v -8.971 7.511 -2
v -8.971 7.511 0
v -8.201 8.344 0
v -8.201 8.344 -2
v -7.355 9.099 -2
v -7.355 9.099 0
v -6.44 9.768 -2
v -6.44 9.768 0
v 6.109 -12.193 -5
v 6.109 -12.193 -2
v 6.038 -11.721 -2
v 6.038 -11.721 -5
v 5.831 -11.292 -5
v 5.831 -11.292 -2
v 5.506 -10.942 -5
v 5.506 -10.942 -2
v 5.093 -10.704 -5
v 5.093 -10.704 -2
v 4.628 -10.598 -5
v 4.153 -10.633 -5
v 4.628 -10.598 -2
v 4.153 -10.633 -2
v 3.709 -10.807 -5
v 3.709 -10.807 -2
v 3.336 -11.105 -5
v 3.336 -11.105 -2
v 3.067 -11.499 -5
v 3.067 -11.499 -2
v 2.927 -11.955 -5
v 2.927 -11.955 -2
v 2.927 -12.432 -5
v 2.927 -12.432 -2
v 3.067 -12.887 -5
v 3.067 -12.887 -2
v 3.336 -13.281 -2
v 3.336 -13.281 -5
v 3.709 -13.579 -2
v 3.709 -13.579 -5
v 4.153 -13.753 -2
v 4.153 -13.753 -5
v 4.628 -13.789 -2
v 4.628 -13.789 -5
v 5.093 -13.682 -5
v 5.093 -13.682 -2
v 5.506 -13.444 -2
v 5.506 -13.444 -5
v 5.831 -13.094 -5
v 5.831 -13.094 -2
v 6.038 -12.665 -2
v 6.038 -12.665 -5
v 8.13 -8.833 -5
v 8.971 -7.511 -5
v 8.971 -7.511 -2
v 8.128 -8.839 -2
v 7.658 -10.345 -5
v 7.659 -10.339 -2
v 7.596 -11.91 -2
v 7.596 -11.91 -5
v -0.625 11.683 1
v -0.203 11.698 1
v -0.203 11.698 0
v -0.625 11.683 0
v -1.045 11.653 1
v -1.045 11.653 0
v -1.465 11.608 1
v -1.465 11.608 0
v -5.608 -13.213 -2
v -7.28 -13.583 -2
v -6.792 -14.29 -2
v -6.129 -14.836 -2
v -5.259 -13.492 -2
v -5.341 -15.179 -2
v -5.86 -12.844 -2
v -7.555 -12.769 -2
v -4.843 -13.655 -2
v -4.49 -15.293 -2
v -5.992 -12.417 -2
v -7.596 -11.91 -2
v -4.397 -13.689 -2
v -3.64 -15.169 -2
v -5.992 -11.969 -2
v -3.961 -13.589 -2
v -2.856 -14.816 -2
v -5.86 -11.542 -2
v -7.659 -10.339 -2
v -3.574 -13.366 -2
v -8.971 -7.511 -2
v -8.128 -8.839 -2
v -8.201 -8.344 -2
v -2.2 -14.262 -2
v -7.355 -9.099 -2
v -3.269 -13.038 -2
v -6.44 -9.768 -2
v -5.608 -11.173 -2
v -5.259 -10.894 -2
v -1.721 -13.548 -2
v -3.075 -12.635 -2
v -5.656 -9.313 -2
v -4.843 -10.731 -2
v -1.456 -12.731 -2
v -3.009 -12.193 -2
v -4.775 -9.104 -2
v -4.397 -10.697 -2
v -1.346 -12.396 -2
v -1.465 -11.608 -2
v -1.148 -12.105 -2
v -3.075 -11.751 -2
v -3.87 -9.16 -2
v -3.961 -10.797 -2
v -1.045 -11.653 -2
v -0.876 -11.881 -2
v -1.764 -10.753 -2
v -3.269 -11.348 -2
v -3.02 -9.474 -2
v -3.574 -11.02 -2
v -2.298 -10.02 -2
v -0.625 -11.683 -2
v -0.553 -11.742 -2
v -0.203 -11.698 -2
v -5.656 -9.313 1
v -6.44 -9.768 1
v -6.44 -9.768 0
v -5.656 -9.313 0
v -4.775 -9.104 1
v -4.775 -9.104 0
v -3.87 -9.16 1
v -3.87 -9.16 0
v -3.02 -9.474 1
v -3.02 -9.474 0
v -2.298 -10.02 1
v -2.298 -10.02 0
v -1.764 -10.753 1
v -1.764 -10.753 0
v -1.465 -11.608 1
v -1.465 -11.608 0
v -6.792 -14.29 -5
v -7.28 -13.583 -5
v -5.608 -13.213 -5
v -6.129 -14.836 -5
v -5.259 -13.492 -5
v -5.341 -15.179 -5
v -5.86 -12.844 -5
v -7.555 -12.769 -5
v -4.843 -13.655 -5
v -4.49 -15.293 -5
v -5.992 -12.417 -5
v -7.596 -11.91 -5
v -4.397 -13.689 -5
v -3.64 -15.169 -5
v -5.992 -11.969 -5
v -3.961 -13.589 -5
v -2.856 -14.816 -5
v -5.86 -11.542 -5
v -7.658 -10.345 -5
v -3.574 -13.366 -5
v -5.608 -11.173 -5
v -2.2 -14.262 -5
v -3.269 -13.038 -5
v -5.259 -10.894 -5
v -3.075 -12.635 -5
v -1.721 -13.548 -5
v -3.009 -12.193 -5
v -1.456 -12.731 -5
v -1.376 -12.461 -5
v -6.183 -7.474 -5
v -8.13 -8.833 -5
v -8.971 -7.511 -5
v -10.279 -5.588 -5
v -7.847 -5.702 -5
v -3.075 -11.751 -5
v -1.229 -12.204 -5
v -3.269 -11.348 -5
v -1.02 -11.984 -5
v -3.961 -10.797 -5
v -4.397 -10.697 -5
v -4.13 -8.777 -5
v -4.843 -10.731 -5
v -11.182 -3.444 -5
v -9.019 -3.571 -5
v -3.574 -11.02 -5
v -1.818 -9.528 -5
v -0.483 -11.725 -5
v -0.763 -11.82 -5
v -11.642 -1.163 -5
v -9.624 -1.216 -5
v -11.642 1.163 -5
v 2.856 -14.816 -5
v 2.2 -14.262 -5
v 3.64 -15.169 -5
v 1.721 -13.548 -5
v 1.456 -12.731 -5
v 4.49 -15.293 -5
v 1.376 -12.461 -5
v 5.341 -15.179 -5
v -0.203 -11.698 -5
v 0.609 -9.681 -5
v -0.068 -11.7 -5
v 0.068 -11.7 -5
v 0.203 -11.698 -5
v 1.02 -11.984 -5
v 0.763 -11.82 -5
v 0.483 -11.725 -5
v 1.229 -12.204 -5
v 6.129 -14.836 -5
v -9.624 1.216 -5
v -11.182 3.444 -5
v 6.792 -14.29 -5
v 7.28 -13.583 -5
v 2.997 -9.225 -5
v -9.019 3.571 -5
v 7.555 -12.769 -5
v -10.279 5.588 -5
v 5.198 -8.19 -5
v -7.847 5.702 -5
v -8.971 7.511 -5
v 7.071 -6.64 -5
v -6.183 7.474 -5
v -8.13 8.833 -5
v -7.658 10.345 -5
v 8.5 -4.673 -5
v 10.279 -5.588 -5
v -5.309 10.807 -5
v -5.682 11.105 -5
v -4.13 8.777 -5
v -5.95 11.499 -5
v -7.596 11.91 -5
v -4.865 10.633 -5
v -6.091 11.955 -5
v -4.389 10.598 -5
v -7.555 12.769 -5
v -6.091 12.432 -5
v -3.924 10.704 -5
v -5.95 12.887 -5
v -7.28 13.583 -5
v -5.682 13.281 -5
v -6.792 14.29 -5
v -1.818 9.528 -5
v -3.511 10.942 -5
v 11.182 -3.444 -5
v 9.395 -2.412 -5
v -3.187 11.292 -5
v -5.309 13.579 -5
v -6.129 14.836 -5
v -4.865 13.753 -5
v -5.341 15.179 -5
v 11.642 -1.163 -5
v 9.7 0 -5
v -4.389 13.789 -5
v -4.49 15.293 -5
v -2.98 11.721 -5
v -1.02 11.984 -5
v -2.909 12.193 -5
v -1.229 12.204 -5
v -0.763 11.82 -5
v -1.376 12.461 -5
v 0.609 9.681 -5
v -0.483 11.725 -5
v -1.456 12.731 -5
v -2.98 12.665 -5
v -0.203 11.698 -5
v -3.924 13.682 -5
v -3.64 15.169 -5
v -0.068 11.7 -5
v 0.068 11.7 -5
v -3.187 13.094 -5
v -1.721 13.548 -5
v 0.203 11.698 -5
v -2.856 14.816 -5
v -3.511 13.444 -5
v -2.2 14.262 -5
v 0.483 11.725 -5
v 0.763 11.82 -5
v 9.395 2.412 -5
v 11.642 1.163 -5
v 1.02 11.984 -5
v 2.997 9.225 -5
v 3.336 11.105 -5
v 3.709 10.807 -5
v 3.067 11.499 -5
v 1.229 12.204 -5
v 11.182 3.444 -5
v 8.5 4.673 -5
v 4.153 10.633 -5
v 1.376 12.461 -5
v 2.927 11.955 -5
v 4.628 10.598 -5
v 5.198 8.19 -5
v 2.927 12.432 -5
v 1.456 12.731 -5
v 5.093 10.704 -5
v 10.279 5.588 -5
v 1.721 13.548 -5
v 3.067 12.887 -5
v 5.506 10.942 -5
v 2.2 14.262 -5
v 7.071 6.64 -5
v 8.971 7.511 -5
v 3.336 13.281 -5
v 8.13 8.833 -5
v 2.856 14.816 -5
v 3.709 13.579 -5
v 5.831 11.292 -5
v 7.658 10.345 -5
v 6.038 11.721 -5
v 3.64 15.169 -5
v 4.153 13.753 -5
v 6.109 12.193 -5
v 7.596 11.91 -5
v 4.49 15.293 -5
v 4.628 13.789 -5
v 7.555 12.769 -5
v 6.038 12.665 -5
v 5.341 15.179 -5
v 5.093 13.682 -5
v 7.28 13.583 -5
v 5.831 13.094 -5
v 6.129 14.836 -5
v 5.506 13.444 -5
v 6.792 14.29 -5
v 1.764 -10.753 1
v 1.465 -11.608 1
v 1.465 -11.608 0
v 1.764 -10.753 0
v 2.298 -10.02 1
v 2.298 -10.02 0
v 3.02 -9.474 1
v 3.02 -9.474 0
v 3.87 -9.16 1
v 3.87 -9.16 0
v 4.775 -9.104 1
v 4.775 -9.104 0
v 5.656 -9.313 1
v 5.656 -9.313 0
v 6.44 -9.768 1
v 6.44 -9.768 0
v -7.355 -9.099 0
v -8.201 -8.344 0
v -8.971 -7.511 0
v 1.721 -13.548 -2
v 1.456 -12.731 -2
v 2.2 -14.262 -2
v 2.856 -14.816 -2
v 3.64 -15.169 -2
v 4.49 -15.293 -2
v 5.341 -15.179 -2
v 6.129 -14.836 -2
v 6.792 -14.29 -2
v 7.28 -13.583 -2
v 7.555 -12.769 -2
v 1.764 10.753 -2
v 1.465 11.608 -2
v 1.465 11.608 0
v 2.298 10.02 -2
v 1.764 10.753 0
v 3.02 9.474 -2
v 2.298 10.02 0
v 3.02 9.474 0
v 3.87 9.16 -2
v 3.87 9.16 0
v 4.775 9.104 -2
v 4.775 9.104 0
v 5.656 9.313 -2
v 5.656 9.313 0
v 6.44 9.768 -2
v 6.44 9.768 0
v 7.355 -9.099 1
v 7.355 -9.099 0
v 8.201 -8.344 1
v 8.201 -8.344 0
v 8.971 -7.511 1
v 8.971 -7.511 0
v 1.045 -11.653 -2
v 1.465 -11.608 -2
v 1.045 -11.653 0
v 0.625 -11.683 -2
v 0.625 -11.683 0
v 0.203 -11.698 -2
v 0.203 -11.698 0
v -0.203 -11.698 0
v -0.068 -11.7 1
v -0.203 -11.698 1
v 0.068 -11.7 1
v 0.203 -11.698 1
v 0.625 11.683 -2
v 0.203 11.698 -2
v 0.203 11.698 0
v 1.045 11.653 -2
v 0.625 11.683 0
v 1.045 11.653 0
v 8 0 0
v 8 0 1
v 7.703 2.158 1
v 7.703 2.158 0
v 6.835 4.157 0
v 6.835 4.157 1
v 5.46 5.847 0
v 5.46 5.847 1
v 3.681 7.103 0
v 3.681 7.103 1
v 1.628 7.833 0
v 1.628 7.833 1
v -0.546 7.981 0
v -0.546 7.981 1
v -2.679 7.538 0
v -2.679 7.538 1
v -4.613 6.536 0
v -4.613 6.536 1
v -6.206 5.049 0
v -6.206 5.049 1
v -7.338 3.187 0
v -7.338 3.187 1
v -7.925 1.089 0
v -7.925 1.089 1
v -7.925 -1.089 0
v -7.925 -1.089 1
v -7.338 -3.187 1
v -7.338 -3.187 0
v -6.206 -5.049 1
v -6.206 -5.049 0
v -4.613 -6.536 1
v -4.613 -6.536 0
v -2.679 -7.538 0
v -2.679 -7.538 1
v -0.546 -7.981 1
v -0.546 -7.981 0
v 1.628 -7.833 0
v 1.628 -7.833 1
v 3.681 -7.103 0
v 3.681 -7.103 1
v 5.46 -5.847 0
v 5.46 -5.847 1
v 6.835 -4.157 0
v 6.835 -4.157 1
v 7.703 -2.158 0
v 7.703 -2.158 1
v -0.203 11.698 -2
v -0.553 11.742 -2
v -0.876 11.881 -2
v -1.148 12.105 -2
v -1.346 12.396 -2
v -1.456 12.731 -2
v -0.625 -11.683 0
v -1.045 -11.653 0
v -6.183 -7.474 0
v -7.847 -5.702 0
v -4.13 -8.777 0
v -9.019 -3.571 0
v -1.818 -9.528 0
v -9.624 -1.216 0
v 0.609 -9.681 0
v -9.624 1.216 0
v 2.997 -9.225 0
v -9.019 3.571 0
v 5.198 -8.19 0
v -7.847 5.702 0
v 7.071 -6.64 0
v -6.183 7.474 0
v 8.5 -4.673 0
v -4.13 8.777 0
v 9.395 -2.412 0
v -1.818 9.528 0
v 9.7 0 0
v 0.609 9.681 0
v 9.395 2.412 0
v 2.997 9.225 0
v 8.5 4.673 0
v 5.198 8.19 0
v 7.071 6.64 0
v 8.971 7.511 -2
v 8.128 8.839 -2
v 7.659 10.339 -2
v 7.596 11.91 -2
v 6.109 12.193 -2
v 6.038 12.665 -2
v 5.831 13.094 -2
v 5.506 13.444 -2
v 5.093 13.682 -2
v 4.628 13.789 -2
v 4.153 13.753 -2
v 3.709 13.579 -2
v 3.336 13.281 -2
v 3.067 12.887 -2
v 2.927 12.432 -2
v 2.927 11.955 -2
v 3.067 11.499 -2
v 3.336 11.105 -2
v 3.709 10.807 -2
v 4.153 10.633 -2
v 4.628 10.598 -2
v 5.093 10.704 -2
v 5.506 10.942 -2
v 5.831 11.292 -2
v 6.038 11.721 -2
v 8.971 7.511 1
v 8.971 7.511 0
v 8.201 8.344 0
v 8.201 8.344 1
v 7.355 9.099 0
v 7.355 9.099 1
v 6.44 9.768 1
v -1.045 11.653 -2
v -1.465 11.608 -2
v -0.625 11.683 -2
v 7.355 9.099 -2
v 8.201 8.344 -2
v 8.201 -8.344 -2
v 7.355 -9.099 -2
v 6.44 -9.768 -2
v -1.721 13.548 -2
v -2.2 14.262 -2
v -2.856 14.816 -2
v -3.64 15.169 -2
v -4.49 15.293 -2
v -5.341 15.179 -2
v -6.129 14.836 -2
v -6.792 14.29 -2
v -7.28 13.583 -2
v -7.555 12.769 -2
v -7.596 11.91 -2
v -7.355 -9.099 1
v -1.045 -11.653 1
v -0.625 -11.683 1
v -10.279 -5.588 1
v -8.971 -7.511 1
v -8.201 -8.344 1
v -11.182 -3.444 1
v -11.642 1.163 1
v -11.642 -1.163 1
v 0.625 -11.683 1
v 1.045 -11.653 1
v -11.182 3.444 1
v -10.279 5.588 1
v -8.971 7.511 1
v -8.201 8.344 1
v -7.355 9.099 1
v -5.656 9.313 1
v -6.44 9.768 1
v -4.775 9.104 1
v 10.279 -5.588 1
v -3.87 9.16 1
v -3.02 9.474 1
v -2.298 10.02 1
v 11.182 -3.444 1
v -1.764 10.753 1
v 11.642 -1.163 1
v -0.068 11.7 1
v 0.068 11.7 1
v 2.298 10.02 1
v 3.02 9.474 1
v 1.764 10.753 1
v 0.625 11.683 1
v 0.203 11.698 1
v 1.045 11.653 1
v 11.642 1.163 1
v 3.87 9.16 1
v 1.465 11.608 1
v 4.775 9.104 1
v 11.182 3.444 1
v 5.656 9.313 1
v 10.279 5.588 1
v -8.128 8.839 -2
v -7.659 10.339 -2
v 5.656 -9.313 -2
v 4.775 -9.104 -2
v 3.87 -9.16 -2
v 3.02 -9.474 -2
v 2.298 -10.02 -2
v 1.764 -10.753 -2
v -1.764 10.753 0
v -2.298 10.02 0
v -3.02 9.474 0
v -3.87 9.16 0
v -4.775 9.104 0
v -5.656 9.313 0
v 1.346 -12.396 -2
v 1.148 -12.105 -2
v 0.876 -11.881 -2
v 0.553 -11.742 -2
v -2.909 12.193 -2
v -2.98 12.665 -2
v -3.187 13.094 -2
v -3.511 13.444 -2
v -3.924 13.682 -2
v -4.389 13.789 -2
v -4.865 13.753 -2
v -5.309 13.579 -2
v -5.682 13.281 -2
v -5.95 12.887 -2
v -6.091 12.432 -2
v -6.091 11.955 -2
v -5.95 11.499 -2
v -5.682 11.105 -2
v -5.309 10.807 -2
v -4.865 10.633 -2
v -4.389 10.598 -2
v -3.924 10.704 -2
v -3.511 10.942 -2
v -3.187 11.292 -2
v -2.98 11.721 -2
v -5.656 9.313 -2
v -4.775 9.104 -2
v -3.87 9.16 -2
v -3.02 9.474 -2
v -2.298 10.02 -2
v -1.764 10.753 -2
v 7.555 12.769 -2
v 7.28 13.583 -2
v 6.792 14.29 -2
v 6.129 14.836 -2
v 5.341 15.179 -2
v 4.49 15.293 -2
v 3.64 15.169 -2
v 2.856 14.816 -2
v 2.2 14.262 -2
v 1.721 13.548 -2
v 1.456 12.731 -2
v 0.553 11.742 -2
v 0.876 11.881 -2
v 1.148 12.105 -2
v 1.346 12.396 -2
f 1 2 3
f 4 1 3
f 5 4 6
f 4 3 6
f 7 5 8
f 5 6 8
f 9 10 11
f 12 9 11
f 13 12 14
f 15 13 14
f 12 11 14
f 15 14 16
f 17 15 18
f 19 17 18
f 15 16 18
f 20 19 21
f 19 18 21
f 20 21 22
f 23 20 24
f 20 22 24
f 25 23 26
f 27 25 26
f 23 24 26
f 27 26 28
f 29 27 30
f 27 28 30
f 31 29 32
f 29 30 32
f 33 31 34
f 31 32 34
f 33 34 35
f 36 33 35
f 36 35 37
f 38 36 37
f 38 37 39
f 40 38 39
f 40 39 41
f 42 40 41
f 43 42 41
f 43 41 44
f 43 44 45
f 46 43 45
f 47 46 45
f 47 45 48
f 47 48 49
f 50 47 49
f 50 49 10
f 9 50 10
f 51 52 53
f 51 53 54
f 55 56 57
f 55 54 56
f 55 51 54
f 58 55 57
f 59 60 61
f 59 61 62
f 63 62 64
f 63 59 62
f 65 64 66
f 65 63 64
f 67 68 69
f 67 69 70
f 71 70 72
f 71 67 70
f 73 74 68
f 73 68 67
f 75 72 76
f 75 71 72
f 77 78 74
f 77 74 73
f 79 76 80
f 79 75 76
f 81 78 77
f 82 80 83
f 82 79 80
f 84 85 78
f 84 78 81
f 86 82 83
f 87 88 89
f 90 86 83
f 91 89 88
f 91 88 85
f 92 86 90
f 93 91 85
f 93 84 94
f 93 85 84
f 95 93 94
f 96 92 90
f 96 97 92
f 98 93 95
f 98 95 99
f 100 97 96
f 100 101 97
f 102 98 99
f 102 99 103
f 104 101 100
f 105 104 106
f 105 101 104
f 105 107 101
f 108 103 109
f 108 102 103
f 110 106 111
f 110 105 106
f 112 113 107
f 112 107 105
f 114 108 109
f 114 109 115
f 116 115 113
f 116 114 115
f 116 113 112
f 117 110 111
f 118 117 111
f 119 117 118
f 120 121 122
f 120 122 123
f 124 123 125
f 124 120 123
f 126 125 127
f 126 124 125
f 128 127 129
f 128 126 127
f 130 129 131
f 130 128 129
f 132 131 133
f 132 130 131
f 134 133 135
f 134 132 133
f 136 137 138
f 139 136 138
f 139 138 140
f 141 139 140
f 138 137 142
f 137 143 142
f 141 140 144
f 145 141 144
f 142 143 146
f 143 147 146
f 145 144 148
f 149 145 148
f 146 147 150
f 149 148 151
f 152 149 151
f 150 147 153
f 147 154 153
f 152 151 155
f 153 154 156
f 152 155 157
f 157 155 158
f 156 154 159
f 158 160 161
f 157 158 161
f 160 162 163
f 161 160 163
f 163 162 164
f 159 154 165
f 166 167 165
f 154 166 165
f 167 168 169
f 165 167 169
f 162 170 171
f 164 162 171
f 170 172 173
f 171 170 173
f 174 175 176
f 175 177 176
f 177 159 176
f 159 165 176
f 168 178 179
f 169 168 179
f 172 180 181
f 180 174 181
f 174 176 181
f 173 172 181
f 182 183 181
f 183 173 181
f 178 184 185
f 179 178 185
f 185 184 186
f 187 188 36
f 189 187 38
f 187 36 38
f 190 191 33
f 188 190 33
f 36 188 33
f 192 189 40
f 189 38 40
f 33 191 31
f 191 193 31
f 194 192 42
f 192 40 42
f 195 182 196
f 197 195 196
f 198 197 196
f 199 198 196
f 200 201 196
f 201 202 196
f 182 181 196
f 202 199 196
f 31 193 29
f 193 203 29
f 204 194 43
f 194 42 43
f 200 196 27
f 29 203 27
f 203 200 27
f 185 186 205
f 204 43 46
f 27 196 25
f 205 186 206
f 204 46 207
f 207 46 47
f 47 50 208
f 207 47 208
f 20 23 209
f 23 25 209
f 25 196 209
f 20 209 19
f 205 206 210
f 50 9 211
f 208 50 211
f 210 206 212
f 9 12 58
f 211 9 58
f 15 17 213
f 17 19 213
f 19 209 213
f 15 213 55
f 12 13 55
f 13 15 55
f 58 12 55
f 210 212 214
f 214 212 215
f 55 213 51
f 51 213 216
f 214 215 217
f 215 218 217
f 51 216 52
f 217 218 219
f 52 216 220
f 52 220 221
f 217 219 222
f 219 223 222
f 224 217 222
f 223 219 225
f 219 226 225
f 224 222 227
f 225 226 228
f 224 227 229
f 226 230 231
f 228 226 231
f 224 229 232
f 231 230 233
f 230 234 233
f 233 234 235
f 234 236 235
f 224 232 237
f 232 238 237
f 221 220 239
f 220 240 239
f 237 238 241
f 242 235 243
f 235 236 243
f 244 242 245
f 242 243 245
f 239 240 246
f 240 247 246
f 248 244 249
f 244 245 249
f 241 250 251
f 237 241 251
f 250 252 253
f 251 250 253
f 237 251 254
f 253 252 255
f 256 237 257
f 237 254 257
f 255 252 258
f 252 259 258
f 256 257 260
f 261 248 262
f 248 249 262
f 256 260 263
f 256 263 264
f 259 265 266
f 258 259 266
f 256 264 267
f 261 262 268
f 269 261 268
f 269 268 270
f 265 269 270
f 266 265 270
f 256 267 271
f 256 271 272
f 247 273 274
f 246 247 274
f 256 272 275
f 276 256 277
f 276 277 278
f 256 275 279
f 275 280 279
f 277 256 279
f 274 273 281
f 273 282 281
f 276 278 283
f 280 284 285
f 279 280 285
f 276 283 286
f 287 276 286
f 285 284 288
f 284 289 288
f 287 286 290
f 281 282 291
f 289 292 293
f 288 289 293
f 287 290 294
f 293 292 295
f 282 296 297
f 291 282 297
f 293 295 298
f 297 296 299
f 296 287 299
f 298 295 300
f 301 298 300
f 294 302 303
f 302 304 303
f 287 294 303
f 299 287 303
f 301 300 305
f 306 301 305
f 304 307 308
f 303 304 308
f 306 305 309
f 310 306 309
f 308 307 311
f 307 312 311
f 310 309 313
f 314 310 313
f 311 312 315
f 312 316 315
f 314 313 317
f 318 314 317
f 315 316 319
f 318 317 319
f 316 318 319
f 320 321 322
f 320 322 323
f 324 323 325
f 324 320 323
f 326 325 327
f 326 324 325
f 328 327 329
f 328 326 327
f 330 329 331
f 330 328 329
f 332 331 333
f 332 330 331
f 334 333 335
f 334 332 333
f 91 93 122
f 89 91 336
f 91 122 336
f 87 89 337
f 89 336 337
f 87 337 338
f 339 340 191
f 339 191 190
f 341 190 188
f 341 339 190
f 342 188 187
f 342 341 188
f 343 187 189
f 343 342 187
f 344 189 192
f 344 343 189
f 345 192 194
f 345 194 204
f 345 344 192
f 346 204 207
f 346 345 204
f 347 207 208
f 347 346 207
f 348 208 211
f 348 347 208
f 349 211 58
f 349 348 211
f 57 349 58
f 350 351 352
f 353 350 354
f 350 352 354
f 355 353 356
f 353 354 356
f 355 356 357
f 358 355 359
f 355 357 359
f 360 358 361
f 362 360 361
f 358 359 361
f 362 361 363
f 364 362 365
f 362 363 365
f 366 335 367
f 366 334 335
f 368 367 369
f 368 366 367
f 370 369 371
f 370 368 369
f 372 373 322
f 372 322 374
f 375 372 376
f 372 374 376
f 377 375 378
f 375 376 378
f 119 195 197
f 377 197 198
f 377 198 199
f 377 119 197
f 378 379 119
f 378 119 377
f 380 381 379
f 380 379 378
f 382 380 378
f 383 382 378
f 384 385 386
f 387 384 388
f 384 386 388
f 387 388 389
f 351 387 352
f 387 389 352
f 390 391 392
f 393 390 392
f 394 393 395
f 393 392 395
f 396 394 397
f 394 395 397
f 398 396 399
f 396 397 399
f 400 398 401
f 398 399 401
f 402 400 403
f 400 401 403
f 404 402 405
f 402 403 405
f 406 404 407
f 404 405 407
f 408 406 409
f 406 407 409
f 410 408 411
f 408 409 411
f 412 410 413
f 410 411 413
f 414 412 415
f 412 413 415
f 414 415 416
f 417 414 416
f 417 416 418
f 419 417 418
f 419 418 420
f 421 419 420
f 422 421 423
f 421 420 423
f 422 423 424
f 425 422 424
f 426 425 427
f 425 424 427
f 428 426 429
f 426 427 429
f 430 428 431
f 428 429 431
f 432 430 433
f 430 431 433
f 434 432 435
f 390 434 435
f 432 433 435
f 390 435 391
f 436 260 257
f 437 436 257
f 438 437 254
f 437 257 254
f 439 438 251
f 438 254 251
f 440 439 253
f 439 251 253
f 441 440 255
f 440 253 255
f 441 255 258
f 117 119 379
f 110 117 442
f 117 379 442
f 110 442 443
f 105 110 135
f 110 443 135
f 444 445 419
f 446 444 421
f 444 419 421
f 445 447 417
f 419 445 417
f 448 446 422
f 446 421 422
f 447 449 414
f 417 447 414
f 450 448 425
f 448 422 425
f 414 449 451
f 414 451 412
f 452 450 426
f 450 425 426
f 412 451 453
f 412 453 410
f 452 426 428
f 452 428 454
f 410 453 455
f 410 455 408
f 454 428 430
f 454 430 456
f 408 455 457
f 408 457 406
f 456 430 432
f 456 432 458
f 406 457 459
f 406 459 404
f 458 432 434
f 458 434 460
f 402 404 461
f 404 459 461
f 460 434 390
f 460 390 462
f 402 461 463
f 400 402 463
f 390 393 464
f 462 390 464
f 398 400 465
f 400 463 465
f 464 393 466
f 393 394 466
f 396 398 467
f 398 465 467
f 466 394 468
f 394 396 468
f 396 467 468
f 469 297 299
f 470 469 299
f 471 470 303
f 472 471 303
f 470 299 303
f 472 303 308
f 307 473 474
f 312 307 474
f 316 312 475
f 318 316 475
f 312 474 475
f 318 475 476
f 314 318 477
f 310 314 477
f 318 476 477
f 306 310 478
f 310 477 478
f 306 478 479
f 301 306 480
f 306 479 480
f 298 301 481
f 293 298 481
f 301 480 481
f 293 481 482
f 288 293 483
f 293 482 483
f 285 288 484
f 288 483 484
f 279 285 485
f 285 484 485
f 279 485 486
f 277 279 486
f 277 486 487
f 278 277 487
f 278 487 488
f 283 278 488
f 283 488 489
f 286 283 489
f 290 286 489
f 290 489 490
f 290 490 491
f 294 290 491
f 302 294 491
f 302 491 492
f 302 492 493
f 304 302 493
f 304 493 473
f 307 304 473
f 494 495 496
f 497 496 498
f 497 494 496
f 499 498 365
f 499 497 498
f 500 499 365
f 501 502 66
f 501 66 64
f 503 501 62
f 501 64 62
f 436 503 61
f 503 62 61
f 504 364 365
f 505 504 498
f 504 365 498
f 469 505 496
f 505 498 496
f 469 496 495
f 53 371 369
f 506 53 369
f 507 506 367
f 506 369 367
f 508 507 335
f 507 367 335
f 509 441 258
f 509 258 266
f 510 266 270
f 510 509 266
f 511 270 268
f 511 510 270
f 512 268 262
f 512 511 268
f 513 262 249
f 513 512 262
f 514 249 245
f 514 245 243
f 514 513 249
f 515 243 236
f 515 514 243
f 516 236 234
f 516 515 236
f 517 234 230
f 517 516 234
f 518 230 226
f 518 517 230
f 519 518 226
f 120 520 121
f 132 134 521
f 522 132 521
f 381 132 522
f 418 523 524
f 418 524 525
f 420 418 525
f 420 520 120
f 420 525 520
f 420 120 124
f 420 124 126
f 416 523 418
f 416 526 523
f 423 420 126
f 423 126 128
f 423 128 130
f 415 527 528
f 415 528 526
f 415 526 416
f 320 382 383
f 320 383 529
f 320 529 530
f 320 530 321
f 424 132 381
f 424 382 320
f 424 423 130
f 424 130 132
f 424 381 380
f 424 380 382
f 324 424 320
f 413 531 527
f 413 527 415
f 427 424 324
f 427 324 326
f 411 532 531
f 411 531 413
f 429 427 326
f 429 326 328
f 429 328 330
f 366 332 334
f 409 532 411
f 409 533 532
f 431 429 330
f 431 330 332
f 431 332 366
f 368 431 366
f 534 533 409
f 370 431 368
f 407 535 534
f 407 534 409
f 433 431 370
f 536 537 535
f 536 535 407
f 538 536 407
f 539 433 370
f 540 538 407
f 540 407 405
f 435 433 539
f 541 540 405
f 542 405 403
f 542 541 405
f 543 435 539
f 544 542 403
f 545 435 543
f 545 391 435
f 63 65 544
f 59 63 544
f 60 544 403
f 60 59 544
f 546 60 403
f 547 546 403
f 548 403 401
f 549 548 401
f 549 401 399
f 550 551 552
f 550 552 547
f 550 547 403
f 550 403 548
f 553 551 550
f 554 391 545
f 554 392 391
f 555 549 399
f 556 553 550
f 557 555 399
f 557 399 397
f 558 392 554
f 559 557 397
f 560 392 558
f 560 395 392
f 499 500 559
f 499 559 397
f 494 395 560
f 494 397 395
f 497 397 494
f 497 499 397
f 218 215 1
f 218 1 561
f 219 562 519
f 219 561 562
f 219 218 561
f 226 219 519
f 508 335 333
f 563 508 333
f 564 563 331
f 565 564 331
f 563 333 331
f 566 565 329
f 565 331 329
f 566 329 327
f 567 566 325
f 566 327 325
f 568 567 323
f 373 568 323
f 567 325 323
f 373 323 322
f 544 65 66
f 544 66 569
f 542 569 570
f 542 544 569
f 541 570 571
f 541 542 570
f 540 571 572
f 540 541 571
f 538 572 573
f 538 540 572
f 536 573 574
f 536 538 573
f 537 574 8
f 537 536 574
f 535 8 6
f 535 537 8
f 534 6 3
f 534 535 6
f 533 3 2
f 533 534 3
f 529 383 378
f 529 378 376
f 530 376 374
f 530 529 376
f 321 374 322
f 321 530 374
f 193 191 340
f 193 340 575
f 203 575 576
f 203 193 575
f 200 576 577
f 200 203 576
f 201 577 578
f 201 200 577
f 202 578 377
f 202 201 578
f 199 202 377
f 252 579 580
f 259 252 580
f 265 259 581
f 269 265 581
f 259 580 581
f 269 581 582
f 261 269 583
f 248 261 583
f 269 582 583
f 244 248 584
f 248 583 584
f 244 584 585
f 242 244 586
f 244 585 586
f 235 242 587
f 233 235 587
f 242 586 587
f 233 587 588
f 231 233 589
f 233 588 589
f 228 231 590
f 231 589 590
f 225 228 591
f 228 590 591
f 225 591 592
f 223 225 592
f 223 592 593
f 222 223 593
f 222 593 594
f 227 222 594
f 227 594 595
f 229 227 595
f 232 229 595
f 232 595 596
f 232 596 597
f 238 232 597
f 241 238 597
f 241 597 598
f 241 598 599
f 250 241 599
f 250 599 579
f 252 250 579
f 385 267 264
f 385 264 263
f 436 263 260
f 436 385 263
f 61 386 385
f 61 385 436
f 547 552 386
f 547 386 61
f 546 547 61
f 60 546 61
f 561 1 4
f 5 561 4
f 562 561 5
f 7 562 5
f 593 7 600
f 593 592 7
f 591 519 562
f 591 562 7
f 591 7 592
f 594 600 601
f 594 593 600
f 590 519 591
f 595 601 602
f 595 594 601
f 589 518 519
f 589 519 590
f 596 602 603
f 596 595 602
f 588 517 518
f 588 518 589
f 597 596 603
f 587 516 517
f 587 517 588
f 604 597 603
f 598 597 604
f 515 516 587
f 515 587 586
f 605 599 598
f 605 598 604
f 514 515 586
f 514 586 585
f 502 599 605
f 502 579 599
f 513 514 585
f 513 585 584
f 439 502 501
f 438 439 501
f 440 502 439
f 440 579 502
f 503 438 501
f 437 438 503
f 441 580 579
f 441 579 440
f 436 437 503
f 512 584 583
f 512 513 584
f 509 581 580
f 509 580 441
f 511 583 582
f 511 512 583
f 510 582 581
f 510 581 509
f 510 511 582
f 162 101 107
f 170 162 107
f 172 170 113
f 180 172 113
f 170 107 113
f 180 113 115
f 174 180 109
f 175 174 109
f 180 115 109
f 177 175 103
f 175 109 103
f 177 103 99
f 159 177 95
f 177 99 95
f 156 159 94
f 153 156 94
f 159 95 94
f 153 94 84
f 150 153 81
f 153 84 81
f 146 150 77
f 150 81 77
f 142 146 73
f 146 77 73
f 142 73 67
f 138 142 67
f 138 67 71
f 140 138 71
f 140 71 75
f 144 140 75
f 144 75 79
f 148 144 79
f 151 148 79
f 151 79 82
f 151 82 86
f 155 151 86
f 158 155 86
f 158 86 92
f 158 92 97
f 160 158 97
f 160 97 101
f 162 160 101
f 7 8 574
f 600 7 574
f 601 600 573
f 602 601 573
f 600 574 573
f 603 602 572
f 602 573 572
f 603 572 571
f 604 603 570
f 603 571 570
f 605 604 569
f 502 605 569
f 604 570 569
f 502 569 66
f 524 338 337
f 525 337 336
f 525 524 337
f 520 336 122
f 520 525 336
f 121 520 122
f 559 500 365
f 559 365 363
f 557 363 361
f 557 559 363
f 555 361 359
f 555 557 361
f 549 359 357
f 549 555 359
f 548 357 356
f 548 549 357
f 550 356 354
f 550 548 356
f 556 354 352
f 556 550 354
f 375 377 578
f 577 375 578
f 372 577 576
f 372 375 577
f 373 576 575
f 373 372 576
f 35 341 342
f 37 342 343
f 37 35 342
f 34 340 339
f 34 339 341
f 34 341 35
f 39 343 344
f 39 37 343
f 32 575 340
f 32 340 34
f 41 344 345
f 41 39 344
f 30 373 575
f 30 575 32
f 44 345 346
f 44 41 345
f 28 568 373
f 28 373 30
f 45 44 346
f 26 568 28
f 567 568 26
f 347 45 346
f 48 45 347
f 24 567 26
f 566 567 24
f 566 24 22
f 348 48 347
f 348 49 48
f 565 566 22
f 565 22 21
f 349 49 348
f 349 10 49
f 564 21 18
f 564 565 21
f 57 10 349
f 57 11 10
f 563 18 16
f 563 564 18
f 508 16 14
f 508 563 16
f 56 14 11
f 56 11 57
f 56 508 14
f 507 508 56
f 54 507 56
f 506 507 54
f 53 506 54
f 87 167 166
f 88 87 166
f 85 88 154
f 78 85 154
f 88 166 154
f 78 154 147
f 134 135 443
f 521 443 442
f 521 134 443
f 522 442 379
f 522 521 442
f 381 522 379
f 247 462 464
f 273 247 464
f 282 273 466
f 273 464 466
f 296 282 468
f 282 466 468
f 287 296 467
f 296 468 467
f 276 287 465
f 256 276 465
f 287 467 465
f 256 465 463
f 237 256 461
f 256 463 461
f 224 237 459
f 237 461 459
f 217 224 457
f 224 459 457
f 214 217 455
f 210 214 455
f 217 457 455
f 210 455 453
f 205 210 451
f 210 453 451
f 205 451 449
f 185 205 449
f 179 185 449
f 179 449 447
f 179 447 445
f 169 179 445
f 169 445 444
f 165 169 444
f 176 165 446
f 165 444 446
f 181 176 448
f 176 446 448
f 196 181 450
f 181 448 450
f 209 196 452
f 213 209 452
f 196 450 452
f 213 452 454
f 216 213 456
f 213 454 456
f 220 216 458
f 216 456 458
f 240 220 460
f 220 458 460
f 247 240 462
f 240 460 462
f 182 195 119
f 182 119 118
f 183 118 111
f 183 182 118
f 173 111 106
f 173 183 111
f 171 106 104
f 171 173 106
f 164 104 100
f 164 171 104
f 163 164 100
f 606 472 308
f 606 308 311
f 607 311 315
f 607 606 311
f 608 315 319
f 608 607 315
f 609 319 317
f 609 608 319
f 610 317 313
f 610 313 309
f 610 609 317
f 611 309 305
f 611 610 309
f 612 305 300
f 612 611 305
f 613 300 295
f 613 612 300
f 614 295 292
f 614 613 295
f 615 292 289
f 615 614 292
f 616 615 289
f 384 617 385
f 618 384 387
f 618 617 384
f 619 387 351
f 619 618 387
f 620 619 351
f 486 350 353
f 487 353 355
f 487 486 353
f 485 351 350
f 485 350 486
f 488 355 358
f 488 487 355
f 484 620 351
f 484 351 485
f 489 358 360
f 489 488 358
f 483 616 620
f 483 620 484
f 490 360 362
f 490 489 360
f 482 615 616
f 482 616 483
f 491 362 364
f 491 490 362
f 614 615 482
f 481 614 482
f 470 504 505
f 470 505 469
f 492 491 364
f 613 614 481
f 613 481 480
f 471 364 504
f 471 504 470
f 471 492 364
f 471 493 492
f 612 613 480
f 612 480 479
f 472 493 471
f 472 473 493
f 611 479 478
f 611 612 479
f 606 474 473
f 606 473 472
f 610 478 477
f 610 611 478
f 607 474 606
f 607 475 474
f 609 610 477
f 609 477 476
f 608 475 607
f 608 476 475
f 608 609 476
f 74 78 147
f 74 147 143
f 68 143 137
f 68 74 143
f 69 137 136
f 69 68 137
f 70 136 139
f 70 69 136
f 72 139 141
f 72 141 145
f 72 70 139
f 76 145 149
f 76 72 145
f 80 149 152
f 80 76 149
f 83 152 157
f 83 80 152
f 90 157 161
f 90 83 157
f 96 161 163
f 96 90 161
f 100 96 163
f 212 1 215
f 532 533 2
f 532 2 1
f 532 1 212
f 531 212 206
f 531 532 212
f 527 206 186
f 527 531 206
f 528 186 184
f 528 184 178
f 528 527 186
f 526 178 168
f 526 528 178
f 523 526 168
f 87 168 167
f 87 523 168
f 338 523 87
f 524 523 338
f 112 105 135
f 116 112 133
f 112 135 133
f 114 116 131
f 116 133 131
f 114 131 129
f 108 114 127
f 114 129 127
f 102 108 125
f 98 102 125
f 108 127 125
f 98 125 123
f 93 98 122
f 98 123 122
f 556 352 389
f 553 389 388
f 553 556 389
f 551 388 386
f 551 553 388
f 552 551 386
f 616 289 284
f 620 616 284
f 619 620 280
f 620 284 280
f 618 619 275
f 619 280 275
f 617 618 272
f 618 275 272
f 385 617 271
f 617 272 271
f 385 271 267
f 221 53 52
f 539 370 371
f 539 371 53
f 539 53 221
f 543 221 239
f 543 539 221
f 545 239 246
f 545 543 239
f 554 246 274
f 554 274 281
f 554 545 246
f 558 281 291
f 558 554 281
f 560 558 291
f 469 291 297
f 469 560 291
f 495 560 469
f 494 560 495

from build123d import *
from build123d.topology import SkipClean

# Parameters (mm, degrees)
SKETCH1_R           = 1.6
SKETCH1_R_2         = 9.7
SKETCH1_R_3         = 1.5
BOSS_EXTRUDE1_DEPTH = 5
BOSS_EXTRUDE2_START = 1
SKETCH1_3_R         = 8
BOSS_EXTRUDE2_DEPTH = 1
FILLET1_R           = 6
FILLET5_R           = 1.25
CUT_EXTRUDE1_START  = 1
CUT_EXTRUDE1_DEPTH  = 3


with BuildPart() as part:
    # Sketch1 → Boss-Extrude1 (new body)
    with BuildSketch(Plane.XY):
        with BuildLine():
            ThreePointArc((6.440028886, -9.768112814), (11.7, 0), (6.440028886, 9.768112814))
            ThreePointArc((6.440028886, 9.768112814), (5.583978873, 15.100635084), (1.464516076, 11.607979698))
            ThreePointArc((1.464516076, 11.607979698), (0, 11.7), (-1.464516076, 11.607979698))
            ThreePointArc((-1.464516076, 11.607979698), (-5.583978873, 15.100635084), (-6.440028886, 9.768112814))
            ThreePointArc((-6.440028886, 9.768112814), (-11.7, 0), (-6.440028886, -9.768112814))
            ThreePointArc((-6.440028886, -9.768112814), (-5.583978873, -15.100635084), (-1.464516076, -11.607979698))
            ThreePointArc((-1.464516076, -11.607979698), (0, -11.7), (1.464516076, -11.607979698))
            ThreePointArc((1.464516076, -11.607979698), (5.583978873, -15.100635084), (6.440028886, -9.768112814))
        make_face()
        with Locations((-4.508802817, 12.193059385)):
            Circle(SKETCH1_R, mode=Mode.SUBTRACT)
        with Locations((4.508802817, 12.193059385)):
            Circle(SKETCH1_R, mode=Mode.SUBTRACT)
        Circle(SKETCH1_R_2, mode=Mode.SUBTRACT)
        with Locations((4.508802817, -12.193059385)):
            Circle(SKETCH1_R, mode=Mode.SUBTRACT)
        with Locations((-4.508802817, -12.193059385)):
            Circle(SKETCH1_R_3, mode=Mode.SUBTRACT)
    extrude(amount=-BOSS_EXTRUDE1_DEPTH)

    # Sketch1<3> → Boss-Extrude2 (add)
    with BuildSketch(Plane.XY.offset(BOSS_EXTRUDE2_START)):
        with BuildLine():
            ThreePointArc((6.440028886, -9.768112814), (11.7, 0), (6.440028886, 9.768112814))
            ThreePointArc((6.440028886, 9.768112814), (3.433626761, 9.285483685), (1.464516076, 11.607979698))
            ThreePointArc((1.464516076, 11.607979698), (0, 11.7), (-1.464516076, 11.607979698))
            ThreePointArc((-1.464516076, 11.607979698), (-3.433626761, 9.285483685), (-6.440028886, 9.768112814))
            ThreePointArc((-6.440028886, 9.768112814), (-11.7, 0), (-6.440028886, -9.768112814))
            ThreePointArc((-6.440028886, -9.768112814), (-3.433626761, -9.285483685), (-1.464516076, -11.607979698))
            ThreePointArc((-1.464516076, -11.607979698), (0, -11.7), (1.464516076, -11.607979698))
            ThreePointArc((1.464516076, -11.607979698), (3.433626761, -9.285483685), (6.440028886, -9.768112814))
        make_face()
        Circle(SKETCH1_3_R, mode=Mode.SUBTRACT)
    extrude(amount=-BOSS_EXTRUDE2_DEPTH)

    # Fillet1
    fillet1_edges = [part.edges().sort_by_distance(p)[0] for p in [
        (-6.440028886, -9.768112814, -2.5),
        (-6.440028886, 9.768112814, -2.5),
        (6.440028886, 9.768112814, -2.5),
        (6.440028886, -9.768112814, -2.5),
    ]]
    fillet(fillet1_edges, radius=FILLET1_R)

    # Fillet5
    fillet5_edges = [part.edges().sort_by_distance(p)[0] for p in [
        (-1.464516076, 11.607979698, -2.5),
        (1.464516076, 11.607979698, -2.5),
        (1.464516076, -11.607979698, -2.5),
        (-1.464516076, -11.607979698, -2.5),
    ]]
    fillet(fillet5_edges, radius=FILLET5_R)

    # Sketch2 → Cut-Extrude1 (cut)
    with SkipClean():  # the faces are left unmerged after this step: merging them gives an invalid solid
        with BuildSketch(Plane.XY.offset(CUT_EXTRUDE1_START)):
            with BuildLine():
                ThreePointArc((-1.464516076, -11.607979698), (-3.433626761, -9.285483685), (-6.440028886, -9.768112814))
                ThreePointArc((-6.440028886, -9.768112814), (-7.78749678, -8.731832219), (-8.970582034, -7.511235449))
                ThreePointArc((-8.970582034, -7.511235449), (-7.843991966, -9.57352888), (-7.59588423, -11.910343363))
                ThreePointArc((-7.59588423, -11.910343363), (-4.919534521, -15.265729147), (-1.455850964, -12.73109747))
                ThreePointArc((-1.455850964, -12.73109747), (-1.020006813, -11.983589345), (-0.203121026, -11.698236698))
                ThreePointArc((-0.203121026, -11.698236698), (-0.835038896, -11.67016324), (-1.464516076, -11.607979698))
            make_face()
            with BuildLine():
                ThreePointArc((6.440028886, -9.768112814), (3.433626761, -9.285483685), (1.464516076, -11.607979698))
                ThreePointArc((1.464516076, -11.607979698), (0.835038896, -11.67016324), (0.203121026, -11.698236698))
                ThreePointArc((0.203121026, -11.698236698), (1.020006813, -11.983589345), (1.455850964, -12.73109747))
                ThreePointArc((1.455850964, -12.73109747), (4.919534521, -15.265729147), (7.59588423, -11.910343363))
                ThreePointArc((7.59588423, -11.910343363), (7.843991966, -9.57352888), (8.970582034, -7.511235449))
                ThreePointArc((8.970582034, -7.511235449), (7.78749678, -8.731832219), (6.440028886, -9.768112814))
            make_face()
            with BuildLine():
                ThreePointArc((-6.440028886, 9.768112814), (-3.433626761, 9.285483685), (-1.464516076, 11.607979698))
                ThreePointArc((-1.464516076, 11.607979698), (-0.835038896, 11.67016324), (-0.203121026, 11.698236698))
                ThreePointArc((-0.203121026, 11.698236698), (-1.020006813, 11.983589345), (-1.455850964, 12.73109747))
                ThreePointArc((-1.455850964, 12.73109747), (-4.919534521, 15.265729147), (-7.59588423, 11.910343363))
                ThreePointArc((-7.59588423, 11.910343363), (-7.843991966, 9.57352888), (-8.970582034, 7.511235449))
                ThreePointArc((-8.970582034, 7.511235449), (-7.78749678, 8.731832219), (-6.440028886, 9.768112814))
            make_face()
            with BuildLine():
                ThreePointArc((1.464516076, 11.607979698), (3.433626761, 9.285483685), (6.440028886, 9.768112814))
                ThreePointArc((6.440028886, 9.768112814), (7.78749678, 8.731832219), (8.970582034, 7.511235449))
                ThreePointArc((8.970582034, 7.511235449), (7.843991966, 9.57352888), (7.59588423, 11.910343363))
                ThreePointArc((7.59588423, 11.910343363), (4.919534521, 15.265729147), (1.455850964, 12.73109747))
                ThreePointArc((1.455850964, 12.73109747), (1.020006813, 11.983589345), (0.203121026, 11.698236698))
                ThreePointArc((0.203121026, 11.698236698), (0.835038896, 11.67016324), (1.464516076, 11.607979698))
            make_face()
        extrude(amount=-CUT_EXTRUDE1_DEPTH, mode=Mode.SUBTRACT)


solid = part.part
